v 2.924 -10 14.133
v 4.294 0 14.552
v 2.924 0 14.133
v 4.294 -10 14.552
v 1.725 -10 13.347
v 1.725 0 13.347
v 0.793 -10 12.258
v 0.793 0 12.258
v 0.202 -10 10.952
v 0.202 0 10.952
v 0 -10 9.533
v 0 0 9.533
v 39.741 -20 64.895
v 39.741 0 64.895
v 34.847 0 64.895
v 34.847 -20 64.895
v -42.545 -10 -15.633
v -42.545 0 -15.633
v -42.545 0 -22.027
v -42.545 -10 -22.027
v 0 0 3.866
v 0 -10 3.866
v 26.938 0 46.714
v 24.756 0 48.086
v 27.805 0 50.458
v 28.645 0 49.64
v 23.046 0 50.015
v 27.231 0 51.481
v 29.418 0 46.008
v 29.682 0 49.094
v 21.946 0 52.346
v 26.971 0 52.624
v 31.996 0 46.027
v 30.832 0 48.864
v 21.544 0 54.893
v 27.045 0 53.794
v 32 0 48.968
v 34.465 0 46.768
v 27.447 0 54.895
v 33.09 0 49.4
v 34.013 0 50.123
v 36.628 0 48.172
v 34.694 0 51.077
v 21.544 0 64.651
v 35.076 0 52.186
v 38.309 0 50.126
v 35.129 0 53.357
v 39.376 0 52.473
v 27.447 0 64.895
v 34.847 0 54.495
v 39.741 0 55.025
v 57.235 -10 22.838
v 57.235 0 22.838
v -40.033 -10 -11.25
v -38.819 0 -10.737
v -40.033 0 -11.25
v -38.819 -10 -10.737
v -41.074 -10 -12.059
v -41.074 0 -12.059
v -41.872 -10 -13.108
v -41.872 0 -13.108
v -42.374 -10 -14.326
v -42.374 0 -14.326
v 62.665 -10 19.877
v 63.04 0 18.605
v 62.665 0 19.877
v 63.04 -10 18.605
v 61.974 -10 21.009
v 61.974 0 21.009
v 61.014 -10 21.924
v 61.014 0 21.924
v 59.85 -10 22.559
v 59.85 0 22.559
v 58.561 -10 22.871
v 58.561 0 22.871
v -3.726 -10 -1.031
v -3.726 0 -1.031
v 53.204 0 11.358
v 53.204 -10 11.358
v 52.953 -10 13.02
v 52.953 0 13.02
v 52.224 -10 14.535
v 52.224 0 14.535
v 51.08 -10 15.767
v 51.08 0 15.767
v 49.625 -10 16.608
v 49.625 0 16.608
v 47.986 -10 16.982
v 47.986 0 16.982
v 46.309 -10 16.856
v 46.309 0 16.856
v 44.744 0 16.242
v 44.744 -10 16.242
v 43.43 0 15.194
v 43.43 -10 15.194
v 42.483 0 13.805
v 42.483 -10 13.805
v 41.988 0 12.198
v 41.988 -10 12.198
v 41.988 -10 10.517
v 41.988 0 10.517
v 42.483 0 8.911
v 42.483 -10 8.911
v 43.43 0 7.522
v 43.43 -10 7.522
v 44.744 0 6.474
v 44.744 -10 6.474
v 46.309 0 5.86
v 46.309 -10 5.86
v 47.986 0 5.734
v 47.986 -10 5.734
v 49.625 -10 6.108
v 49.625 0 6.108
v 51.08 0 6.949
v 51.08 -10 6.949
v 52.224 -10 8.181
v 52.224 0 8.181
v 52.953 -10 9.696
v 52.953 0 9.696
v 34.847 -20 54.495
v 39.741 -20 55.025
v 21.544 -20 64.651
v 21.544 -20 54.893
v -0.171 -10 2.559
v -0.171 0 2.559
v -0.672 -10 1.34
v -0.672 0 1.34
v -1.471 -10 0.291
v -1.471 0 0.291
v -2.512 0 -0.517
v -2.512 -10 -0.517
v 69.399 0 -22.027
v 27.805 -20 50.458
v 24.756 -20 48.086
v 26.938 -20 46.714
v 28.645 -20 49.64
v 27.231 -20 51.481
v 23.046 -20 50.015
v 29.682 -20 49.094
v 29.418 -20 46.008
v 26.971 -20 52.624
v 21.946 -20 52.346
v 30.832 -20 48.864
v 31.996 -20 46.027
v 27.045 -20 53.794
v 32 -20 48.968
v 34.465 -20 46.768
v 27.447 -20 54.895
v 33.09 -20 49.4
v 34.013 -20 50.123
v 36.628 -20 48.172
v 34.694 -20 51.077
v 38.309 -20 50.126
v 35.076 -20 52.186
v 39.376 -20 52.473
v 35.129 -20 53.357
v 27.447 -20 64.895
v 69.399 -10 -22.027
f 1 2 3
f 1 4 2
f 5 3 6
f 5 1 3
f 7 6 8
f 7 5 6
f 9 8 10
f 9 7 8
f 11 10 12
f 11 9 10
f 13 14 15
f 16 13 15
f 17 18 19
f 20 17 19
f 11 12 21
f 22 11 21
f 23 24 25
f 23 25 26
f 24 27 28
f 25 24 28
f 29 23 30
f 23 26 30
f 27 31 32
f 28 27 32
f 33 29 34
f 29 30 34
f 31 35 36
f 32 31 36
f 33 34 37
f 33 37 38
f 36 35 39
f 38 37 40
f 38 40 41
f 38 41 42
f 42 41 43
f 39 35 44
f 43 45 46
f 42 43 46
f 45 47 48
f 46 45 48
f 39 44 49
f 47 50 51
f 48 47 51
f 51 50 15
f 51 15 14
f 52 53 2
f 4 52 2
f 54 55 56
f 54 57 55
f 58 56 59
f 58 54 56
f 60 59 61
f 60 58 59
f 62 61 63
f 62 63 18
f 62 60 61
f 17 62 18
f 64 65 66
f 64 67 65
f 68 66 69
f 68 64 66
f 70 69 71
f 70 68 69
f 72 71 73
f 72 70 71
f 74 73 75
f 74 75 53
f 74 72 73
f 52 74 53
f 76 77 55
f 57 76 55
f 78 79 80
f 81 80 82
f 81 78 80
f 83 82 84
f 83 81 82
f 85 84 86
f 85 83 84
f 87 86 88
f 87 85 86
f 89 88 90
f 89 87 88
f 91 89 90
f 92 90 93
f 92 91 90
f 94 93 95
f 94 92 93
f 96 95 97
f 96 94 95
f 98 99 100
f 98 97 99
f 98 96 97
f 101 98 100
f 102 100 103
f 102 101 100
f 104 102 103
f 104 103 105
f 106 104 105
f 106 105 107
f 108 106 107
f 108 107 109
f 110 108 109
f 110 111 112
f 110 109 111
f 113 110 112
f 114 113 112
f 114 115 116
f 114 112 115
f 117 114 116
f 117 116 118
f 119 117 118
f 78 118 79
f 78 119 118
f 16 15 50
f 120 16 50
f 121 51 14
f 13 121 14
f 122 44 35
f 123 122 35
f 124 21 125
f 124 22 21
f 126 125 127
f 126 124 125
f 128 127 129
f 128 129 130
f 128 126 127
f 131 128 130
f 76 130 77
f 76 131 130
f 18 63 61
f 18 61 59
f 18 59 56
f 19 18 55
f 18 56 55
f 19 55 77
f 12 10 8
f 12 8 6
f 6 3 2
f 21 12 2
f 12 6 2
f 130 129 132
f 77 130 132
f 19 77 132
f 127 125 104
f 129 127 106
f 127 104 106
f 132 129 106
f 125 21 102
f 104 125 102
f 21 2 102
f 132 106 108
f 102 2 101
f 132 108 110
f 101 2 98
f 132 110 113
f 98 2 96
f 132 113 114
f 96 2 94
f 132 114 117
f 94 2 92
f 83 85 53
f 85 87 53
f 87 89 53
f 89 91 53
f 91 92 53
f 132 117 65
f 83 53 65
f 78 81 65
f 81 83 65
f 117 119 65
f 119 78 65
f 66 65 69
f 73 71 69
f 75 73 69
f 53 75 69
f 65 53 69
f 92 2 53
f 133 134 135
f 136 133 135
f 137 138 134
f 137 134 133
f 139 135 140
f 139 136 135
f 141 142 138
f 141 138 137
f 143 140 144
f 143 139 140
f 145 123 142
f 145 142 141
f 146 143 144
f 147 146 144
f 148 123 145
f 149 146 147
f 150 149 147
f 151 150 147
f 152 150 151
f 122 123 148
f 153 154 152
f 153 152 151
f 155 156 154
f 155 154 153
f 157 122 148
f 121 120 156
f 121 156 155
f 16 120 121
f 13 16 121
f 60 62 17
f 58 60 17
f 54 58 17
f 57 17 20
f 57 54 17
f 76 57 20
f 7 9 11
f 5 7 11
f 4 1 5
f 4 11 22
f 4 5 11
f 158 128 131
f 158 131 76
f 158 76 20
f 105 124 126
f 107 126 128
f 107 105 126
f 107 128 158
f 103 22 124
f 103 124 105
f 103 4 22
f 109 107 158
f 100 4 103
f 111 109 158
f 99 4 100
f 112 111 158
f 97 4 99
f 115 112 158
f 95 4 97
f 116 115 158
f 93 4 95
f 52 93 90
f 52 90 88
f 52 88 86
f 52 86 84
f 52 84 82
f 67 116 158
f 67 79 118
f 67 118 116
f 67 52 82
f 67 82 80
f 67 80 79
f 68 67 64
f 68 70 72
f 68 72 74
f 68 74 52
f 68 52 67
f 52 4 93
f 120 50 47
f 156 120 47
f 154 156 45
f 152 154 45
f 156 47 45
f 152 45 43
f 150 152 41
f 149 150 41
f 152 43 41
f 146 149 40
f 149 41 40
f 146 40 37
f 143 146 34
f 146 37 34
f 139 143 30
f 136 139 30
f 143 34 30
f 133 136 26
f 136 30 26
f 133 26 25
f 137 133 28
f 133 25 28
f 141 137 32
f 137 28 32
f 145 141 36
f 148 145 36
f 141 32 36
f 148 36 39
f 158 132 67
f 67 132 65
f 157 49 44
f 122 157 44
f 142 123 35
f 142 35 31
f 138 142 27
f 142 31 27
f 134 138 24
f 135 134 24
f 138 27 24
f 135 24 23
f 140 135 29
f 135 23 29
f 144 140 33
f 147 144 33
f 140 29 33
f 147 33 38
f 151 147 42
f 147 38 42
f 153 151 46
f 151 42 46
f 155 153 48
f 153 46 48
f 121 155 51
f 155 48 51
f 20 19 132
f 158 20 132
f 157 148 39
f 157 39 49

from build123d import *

# Parameters (mm, degrees)
F1_DEPTH = 10
F2_R     = 5.08
F3_R     = 5.639529
F4_DEPTH = 93.354344
F6_DEPTH = 20


with BuildPart() as f1:
    # F0 (on Front) → F1 (new body)
    with BuildSketch(Plane.XZ):
        Polygon((38.018815, -22.026807), (49.484797, -22.026807), (69.399424, -22.026807), (62.254088, 23.623965), (0, 13.879851), (0, 0), (-42.544864, -11.76776), (-42.544864, -22.026807), align=None)
    extrude(amount=F1_DEPTH)

    # F2
    f2_edges = [f1.edges().sort_by_distance(p)[0] for p in [
        (62.254088, -5, 23.623965),
        (0, -5, 13.879851),
        (0, -5, 0),
        (-42.544864, -5, -11.76776),
    ]]
    fillet(f2_edges, radius=F2_R)

    # F3 (on Front) → F4 (cut)
    with BuildSketch(Plane.XZ):
        with Locations((47.564153, 11.357924)):
            Circle(F3_R)
    extrude(amount=F4_DEPTH, mode=Mode.SUBTRACT)


with BuildPart() as f6:
    # F5 (on Front) → F6 (new body)
    with BuildSketch(Plane.XZ):
        with BuildLine():
            ThreePointArc((34.847177, 54.49492), (30.831971, 48.863531), (27.447183, 54.894918))
            Line((27.447183, 54.894918), (27.447183, 64.894918))
            Line((27.447183, 64.894918), (21.543767, 64.650759))
            Line((21.543767, 64.650759), (21.543767, 54.892909))
            ThreePointArc((21.543767, 54.892909), (30.707764, 45.925987), (39.740853, 55.024769))
            Line((39.740853, 55.024769), (39.740853, 64.894918))
            Line((39.740853, 64.894918), (34.847177, 64.894918))
            Line((34.847177, 64.894918), (34.847177, 54.49492))
        make_face()
    extrude(amount=F6_DEPTH)


solid = Compound([f1.part, f6.part])
